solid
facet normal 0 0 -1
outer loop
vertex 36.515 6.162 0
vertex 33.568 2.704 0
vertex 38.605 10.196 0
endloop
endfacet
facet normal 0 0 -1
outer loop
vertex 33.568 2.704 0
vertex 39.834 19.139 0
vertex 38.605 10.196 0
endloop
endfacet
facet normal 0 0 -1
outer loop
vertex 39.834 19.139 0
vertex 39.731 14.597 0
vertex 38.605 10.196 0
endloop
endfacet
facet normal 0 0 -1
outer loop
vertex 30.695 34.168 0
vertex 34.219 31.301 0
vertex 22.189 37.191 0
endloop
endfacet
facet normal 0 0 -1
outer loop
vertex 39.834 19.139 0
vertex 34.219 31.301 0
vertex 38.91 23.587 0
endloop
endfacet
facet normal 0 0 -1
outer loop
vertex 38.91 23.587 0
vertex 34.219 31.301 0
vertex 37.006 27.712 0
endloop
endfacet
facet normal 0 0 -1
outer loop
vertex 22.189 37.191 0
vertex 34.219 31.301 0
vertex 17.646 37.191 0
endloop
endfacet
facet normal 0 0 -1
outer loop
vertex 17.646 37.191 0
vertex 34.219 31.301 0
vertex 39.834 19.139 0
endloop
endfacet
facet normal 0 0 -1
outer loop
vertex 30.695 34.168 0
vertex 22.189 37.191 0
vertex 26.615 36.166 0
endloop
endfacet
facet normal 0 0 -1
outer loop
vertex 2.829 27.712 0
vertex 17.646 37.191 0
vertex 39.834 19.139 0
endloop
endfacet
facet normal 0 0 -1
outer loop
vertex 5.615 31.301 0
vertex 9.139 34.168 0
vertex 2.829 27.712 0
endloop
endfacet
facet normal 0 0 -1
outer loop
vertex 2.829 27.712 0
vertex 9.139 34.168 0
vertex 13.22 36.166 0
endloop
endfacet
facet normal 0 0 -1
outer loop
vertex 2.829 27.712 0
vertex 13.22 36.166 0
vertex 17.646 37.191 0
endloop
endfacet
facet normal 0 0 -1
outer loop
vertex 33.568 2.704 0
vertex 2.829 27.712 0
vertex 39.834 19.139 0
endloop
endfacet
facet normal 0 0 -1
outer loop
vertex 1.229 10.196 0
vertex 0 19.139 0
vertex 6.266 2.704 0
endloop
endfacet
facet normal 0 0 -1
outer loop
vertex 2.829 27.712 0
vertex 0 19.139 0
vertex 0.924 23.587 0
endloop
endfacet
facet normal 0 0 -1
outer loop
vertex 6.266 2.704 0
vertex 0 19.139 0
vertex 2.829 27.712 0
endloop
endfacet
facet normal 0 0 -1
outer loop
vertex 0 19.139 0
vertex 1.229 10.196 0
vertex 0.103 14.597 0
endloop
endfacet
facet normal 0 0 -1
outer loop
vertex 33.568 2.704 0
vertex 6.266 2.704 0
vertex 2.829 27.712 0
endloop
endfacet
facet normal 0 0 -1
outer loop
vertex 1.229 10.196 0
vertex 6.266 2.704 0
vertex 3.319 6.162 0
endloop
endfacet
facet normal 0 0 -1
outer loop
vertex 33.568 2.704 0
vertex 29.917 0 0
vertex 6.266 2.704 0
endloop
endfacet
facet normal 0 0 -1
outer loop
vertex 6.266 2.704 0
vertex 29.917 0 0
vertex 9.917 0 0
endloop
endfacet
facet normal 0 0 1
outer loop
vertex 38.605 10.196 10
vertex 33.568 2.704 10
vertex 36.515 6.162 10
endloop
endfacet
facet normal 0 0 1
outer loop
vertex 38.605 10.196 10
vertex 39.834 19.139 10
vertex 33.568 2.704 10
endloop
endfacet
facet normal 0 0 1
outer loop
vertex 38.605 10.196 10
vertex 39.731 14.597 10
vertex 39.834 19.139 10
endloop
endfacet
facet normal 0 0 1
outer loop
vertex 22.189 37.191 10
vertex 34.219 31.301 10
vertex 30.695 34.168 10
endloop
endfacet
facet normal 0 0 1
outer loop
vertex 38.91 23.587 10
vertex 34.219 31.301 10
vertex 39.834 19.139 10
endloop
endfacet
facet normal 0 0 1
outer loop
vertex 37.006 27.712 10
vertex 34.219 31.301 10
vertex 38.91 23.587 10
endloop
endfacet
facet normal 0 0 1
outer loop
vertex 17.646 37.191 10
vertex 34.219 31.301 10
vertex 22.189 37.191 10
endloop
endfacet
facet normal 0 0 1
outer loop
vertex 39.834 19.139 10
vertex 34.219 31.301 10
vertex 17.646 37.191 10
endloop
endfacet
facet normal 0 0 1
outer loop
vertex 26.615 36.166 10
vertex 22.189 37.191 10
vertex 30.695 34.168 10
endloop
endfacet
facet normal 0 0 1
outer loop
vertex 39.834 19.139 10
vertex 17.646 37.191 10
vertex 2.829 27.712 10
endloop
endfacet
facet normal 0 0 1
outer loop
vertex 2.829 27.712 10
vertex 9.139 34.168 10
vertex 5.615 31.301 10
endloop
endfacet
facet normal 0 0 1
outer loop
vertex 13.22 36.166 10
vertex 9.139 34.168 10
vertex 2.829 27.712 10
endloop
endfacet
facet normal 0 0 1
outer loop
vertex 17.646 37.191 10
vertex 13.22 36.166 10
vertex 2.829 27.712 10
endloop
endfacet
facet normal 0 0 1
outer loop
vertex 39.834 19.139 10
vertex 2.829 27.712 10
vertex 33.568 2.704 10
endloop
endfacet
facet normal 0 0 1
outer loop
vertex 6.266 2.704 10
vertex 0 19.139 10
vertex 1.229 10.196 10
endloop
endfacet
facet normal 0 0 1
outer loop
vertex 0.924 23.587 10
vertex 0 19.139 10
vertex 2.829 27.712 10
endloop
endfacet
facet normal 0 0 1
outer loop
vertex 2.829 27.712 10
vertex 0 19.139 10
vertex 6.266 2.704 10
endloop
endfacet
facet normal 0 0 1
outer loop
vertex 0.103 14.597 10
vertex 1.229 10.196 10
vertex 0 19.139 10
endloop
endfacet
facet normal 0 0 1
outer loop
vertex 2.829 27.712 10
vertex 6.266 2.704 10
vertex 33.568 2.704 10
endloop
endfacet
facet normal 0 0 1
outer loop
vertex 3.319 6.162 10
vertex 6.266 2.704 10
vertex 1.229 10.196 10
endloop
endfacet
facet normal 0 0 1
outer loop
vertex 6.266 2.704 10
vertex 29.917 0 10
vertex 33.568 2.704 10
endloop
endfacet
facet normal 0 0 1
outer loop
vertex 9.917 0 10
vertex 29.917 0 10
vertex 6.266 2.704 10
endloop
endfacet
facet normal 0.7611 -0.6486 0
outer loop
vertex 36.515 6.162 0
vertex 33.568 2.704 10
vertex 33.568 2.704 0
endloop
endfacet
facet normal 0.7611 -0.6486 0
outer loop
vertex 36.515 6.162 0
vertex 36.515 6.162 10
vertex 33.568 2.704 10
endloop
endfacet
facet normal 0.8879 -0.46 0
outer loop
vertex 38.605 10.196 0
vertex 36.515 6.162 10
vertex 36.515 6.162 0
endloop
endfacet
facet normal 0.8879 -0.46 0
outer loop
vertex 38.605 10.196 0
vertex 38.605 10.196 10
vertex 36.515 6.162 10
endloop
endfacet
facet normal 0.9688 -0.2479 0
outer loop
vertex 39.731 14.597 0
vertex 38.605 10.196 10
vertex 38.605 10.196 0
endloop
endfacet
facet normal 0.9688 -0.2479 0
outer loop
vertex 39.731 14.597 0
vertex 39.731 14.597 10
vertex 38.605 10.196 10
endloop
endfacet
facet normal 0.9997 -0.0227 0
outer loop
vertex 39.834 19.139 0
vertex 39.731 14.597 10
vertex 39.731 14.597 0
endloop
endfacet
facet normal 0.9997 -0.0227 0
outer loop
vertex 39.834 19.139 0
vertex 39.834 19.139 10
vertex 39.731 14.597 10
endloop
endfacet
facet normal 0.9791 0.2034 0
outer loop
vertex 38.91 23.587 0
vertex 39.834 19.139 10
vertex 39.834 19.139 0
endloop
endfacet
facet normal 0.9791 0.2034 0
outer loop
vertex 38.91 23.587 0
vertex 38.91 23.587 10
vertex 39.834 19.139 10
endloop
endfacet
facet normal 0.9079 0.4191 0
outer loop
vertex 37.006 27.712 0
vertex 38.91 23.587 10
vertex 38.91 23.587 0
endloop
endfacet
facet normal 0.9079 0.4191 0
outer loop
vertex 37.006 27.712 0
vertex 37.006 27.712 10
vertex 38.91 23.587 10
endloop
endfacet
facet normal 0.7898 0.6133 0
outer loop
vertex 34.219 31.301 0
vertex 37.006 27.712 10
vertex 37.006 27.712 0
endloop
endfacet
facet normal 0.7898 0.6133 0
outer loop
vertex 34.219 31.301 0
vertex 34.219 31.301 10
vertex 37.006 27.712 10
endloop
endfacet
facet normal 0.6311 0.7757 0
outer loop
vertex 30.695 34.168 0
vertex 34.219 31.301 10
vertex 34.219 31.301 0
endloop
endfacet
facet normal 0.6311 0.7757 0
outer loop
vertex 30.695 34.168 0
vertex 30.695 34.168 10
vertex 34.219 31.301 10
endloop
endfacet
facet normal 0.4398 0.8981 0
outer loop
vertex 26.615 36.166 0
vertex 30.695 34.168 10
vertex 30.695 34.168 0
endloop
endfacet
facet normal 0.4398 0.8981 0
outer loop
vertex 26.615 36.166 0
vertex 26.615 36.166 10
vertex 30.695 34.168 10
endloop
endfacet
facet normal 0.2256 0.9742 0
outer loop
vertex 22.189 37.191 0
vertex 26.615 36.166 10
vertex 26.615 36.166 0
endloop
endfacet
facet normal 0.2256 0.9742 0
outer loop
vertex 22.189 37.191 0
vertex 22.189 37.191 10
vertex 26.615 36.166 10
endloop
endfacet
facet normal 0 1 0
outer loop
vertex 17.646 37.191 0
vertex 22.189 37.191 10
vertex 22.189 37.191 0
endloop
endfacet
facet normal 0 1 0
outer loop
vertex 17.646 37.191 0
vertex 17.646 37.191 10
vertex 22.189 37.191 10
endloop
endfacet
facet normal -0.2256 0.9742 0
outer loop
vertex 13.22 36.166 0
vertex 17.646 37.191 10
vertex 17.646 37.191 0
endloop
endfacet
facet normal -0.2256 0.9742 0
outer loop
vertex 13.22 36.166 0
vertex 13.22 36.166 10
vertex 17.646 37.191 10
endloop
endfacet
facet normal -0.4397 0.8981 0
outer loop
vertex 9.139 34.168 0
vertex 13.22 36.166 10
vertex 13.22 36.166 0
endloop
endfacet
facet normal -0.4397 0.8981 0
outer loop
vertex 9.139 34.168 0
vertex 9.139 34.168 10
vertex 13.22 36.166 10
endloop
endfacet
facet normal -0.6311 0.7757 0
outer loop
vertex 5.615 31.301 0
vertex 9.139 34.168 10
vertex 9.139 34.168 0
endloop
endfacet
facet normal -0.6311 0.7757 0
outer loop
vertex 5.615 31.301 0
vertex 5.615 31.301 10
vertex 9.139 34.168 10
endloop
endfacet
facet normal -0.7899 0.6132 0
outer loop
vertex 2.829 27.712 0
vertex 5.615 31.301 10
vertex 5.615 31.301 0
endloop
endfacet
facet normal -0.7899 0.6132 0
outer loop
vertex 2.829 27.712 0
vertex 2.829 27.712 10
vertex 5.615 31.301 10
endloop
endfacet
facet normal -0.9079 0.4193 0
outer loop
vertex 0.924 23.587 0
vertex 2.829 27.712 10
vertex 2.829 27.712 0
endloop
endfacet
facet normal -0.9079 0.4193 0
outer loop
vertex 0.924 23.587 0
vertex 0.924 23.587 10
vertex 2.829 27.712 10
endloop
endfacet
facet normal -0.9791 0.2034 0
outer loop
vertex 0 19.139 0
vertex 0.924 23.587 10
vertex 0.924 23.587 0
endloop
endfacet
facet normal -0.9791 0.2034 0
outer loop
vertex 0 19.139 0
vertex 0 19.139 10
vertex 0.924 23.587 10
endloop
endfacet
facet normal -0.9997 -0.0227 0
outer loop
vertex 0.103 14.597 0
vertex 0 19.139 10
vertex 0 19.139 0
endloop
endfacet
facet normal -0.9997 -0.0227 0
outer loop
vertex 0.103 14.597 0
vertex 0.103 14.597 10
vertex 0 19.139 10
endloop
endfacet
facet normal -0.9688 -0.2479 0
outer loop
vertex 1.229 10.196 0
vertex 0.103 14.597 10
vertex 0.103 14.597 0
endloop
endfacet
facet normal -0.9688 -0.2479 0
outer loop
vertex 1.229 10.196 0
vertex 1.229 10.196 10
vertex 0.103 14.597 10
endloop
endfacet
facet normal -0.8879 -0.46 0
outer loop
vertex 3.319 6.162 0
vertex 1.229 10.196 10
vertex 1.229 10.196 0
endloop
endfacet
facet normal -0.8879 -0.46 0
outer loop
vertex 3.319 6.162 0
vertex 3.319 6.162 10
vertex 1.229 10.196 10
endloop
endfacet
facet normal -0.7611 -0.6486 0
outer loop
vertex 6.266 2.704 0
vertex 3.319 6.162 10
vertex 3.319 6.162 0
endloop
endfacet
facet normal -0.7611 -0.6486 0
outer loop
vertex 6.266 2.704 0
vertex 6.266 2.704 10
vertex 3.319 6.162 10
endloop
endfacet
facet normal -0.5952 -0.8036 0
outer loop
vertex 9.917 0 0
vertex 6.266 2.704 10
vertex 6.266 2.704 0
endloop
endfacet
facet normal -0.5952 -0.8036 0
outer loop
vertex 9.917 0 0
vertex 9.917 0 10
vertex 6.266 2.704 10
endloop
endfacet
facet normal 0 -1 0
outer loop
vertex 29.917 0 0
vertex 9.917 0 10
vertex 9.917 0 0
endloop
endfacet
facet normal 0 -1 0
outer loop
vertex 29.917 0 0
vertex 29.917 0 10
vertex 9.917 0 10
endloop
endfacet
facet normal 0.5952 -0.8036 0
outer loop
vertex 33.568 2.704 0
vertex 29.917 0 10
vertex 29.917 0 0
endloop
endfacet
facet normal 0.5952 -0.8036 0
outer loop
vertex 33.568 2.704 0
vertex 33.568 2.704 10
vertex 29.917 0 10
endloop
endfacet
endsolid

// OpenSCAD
$fn = 32;

// ----------------------------------------------------------------------
// Flat adaptor: single_d, 10 mm thick
// ----------------------------------------------------------------------

// --- parameters (mm) ---
profile_height = 10;      // extrusion height
profile_points = 24;      // points of the closed outline

profile = [[29.917, 0], [33.568, 2.704], [36.515, 6.162], [38.605, 10.196], [39.731, 14.597], [39.834, 19.139], [38.91, 23.587], [37.006, 27.712], [34.219, 31.301], [30.695, 34.168], [26.615, 36.166], [22.189, 37.191], [17.646, 37.191], [13.22, 36.166], [9.139, 34.168], [5.615, 31.301], [2.829, 27.712], [0.924, 23.587], [0, 19.139], [0.103, 14.597], [1.229, 10.196], [3.319, 6.162], [6.266, 2.704], [9.917, 0]];  // single closed polygon, 24 points, counter clockwise

// --- the one profile operation ---
linear_extrude(height = profile_height) polygon(points = profile);
